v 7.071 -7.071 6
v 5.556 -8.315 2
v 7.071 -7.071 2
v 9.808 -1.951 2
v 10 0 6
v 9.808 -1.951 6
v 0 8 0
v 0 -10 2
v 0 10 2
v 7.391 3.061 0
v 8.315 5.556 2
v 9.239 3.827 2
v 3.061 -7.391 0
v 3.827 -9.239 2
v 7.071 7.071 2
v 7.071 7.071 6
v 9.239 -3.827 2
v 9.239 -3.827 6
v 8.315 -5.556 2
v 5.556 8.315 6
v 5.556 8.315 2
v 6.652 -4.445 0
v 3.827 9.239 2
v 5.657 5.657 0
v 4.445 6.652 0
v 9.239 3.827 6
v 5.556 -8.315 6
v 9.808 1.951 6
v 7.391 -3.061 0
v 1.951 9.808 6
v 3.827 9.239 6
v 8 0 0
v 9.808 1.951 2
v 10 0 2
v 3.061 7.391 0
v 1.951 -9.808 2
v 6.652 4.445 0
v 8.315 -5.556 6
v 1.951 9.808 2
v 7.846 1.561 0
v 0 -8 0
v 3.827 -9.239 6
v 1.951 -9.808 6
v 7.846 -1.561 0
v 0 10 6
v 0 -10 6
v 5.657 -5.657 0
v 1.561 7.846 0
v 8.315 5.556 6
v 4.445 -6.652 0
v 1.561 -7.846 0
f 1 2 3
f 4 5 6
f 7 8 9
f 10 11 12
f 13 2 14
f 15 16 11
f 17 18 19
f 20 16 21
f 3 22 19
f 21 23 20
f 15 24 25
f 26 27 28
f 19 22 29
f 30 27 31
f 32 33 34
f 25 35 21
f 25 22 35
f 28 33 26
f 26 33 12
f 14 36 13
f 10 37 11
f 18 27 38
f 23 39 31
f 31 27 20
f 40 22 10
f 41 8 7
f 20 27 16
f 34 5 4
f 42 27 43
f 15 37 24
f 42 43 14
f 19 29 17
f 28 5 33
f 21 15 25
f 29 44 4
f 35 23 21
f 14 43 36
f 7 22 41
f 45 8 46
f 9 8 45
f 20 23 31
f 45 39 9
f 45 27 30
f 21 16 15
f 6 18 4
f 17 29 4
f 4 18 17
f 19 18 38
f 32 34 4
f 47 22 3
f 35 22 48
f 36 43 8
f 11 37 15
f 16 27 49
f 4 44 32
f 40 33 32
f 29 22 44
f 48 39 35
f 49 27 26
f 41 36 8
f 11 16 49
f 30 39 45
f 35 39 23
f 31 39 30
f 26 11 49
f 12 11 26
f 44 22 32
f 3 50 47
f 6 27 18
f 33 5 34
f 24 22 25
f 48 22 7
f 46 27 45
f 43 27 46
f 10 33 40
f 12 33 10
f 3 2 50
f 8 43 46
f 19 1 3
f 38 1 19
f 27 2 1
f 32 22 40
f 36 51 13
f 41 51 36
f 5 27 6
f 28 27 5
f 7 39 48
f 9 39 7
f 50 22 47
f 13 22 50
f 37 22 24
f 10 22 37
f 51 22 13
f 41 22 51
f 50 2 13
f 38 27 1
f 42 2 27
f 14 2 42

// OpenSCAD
// A hull of two half cylinders on one axis: the chamfered lead-in a bayonet lug
// is built as, where each operand is an arc - a ring less half-spaces through
// its axis - and not a whole solid of revolution.
//
// The hull of whole coaxial solids of revolution states the cone it makes
// (declareHullOfRevolution, step-chamfered-cylinder). Of sectors it stated
// nothing, so the cone between the two rims had no record and the band pass
// named it after a rim cylinder it is not on (open item 39, R29: four chamfer
// faces of the bayonet). Over one wedge of at most half a turn the hull's
// boundary is the hull of the whole solids' profiles turned, so the hull states
// that cone, read from each operand's solid tree: a cylinder less a box that
// removes one side of the plane x = 0 over all of it.
//
// What is declared: the two cylinders, r 10 and r 8, and the cone the hull
// makes between the rim r 8 at z 0 and the rim r 10 at z 2 - the profile's
// edge from (8, 0) to (10, 2).
// EXPECT: 3 analytic surfaces available (2 cylindrical, 0 spherical, 0 toroidal, 0 Bezier, 1 conical)
//
// The solid: the profile (0,0) (8,0) (10,2) (10,6) (0,6) turned through half a
// turn - a cone, the r 10 cylinder, the planes z 0 and z 6, and the plane x 0
// the cut leaves.
// ROUNDTRIP: Cone=1 Cylinder=1 Plane=3
//
// Its volume. Every face is written on its surface, so the export is the
// smooth solid: half of the cylinder r 10 from z 2 to 6 and the frustum r 8 to
// 10 from z 0 to 2, (400 pi + 2 pi (64 + 80 + 100) / 3) / 2 = 844 pi / 3. (The
// mesh, on 32-gons each scaled in area by (32 / 2 pi) sin(2 pi / 32), holds
// 878.166570 - which a faceted export would measure instead.)
// VOLUME: 883.8347332
// VOLUME-APPROX: 883.8347332

$fn = 32;
module half(r, h) difference() {
  cylinder(r = r, h = h);
  translate([-2 * r, -r - 1, -1]) cube([2 * r, 2 * r + 2, h + 2]);
}
hull() {
  translate([0, 0, 2]) half(10, 4);
  half(8, 4);
}
